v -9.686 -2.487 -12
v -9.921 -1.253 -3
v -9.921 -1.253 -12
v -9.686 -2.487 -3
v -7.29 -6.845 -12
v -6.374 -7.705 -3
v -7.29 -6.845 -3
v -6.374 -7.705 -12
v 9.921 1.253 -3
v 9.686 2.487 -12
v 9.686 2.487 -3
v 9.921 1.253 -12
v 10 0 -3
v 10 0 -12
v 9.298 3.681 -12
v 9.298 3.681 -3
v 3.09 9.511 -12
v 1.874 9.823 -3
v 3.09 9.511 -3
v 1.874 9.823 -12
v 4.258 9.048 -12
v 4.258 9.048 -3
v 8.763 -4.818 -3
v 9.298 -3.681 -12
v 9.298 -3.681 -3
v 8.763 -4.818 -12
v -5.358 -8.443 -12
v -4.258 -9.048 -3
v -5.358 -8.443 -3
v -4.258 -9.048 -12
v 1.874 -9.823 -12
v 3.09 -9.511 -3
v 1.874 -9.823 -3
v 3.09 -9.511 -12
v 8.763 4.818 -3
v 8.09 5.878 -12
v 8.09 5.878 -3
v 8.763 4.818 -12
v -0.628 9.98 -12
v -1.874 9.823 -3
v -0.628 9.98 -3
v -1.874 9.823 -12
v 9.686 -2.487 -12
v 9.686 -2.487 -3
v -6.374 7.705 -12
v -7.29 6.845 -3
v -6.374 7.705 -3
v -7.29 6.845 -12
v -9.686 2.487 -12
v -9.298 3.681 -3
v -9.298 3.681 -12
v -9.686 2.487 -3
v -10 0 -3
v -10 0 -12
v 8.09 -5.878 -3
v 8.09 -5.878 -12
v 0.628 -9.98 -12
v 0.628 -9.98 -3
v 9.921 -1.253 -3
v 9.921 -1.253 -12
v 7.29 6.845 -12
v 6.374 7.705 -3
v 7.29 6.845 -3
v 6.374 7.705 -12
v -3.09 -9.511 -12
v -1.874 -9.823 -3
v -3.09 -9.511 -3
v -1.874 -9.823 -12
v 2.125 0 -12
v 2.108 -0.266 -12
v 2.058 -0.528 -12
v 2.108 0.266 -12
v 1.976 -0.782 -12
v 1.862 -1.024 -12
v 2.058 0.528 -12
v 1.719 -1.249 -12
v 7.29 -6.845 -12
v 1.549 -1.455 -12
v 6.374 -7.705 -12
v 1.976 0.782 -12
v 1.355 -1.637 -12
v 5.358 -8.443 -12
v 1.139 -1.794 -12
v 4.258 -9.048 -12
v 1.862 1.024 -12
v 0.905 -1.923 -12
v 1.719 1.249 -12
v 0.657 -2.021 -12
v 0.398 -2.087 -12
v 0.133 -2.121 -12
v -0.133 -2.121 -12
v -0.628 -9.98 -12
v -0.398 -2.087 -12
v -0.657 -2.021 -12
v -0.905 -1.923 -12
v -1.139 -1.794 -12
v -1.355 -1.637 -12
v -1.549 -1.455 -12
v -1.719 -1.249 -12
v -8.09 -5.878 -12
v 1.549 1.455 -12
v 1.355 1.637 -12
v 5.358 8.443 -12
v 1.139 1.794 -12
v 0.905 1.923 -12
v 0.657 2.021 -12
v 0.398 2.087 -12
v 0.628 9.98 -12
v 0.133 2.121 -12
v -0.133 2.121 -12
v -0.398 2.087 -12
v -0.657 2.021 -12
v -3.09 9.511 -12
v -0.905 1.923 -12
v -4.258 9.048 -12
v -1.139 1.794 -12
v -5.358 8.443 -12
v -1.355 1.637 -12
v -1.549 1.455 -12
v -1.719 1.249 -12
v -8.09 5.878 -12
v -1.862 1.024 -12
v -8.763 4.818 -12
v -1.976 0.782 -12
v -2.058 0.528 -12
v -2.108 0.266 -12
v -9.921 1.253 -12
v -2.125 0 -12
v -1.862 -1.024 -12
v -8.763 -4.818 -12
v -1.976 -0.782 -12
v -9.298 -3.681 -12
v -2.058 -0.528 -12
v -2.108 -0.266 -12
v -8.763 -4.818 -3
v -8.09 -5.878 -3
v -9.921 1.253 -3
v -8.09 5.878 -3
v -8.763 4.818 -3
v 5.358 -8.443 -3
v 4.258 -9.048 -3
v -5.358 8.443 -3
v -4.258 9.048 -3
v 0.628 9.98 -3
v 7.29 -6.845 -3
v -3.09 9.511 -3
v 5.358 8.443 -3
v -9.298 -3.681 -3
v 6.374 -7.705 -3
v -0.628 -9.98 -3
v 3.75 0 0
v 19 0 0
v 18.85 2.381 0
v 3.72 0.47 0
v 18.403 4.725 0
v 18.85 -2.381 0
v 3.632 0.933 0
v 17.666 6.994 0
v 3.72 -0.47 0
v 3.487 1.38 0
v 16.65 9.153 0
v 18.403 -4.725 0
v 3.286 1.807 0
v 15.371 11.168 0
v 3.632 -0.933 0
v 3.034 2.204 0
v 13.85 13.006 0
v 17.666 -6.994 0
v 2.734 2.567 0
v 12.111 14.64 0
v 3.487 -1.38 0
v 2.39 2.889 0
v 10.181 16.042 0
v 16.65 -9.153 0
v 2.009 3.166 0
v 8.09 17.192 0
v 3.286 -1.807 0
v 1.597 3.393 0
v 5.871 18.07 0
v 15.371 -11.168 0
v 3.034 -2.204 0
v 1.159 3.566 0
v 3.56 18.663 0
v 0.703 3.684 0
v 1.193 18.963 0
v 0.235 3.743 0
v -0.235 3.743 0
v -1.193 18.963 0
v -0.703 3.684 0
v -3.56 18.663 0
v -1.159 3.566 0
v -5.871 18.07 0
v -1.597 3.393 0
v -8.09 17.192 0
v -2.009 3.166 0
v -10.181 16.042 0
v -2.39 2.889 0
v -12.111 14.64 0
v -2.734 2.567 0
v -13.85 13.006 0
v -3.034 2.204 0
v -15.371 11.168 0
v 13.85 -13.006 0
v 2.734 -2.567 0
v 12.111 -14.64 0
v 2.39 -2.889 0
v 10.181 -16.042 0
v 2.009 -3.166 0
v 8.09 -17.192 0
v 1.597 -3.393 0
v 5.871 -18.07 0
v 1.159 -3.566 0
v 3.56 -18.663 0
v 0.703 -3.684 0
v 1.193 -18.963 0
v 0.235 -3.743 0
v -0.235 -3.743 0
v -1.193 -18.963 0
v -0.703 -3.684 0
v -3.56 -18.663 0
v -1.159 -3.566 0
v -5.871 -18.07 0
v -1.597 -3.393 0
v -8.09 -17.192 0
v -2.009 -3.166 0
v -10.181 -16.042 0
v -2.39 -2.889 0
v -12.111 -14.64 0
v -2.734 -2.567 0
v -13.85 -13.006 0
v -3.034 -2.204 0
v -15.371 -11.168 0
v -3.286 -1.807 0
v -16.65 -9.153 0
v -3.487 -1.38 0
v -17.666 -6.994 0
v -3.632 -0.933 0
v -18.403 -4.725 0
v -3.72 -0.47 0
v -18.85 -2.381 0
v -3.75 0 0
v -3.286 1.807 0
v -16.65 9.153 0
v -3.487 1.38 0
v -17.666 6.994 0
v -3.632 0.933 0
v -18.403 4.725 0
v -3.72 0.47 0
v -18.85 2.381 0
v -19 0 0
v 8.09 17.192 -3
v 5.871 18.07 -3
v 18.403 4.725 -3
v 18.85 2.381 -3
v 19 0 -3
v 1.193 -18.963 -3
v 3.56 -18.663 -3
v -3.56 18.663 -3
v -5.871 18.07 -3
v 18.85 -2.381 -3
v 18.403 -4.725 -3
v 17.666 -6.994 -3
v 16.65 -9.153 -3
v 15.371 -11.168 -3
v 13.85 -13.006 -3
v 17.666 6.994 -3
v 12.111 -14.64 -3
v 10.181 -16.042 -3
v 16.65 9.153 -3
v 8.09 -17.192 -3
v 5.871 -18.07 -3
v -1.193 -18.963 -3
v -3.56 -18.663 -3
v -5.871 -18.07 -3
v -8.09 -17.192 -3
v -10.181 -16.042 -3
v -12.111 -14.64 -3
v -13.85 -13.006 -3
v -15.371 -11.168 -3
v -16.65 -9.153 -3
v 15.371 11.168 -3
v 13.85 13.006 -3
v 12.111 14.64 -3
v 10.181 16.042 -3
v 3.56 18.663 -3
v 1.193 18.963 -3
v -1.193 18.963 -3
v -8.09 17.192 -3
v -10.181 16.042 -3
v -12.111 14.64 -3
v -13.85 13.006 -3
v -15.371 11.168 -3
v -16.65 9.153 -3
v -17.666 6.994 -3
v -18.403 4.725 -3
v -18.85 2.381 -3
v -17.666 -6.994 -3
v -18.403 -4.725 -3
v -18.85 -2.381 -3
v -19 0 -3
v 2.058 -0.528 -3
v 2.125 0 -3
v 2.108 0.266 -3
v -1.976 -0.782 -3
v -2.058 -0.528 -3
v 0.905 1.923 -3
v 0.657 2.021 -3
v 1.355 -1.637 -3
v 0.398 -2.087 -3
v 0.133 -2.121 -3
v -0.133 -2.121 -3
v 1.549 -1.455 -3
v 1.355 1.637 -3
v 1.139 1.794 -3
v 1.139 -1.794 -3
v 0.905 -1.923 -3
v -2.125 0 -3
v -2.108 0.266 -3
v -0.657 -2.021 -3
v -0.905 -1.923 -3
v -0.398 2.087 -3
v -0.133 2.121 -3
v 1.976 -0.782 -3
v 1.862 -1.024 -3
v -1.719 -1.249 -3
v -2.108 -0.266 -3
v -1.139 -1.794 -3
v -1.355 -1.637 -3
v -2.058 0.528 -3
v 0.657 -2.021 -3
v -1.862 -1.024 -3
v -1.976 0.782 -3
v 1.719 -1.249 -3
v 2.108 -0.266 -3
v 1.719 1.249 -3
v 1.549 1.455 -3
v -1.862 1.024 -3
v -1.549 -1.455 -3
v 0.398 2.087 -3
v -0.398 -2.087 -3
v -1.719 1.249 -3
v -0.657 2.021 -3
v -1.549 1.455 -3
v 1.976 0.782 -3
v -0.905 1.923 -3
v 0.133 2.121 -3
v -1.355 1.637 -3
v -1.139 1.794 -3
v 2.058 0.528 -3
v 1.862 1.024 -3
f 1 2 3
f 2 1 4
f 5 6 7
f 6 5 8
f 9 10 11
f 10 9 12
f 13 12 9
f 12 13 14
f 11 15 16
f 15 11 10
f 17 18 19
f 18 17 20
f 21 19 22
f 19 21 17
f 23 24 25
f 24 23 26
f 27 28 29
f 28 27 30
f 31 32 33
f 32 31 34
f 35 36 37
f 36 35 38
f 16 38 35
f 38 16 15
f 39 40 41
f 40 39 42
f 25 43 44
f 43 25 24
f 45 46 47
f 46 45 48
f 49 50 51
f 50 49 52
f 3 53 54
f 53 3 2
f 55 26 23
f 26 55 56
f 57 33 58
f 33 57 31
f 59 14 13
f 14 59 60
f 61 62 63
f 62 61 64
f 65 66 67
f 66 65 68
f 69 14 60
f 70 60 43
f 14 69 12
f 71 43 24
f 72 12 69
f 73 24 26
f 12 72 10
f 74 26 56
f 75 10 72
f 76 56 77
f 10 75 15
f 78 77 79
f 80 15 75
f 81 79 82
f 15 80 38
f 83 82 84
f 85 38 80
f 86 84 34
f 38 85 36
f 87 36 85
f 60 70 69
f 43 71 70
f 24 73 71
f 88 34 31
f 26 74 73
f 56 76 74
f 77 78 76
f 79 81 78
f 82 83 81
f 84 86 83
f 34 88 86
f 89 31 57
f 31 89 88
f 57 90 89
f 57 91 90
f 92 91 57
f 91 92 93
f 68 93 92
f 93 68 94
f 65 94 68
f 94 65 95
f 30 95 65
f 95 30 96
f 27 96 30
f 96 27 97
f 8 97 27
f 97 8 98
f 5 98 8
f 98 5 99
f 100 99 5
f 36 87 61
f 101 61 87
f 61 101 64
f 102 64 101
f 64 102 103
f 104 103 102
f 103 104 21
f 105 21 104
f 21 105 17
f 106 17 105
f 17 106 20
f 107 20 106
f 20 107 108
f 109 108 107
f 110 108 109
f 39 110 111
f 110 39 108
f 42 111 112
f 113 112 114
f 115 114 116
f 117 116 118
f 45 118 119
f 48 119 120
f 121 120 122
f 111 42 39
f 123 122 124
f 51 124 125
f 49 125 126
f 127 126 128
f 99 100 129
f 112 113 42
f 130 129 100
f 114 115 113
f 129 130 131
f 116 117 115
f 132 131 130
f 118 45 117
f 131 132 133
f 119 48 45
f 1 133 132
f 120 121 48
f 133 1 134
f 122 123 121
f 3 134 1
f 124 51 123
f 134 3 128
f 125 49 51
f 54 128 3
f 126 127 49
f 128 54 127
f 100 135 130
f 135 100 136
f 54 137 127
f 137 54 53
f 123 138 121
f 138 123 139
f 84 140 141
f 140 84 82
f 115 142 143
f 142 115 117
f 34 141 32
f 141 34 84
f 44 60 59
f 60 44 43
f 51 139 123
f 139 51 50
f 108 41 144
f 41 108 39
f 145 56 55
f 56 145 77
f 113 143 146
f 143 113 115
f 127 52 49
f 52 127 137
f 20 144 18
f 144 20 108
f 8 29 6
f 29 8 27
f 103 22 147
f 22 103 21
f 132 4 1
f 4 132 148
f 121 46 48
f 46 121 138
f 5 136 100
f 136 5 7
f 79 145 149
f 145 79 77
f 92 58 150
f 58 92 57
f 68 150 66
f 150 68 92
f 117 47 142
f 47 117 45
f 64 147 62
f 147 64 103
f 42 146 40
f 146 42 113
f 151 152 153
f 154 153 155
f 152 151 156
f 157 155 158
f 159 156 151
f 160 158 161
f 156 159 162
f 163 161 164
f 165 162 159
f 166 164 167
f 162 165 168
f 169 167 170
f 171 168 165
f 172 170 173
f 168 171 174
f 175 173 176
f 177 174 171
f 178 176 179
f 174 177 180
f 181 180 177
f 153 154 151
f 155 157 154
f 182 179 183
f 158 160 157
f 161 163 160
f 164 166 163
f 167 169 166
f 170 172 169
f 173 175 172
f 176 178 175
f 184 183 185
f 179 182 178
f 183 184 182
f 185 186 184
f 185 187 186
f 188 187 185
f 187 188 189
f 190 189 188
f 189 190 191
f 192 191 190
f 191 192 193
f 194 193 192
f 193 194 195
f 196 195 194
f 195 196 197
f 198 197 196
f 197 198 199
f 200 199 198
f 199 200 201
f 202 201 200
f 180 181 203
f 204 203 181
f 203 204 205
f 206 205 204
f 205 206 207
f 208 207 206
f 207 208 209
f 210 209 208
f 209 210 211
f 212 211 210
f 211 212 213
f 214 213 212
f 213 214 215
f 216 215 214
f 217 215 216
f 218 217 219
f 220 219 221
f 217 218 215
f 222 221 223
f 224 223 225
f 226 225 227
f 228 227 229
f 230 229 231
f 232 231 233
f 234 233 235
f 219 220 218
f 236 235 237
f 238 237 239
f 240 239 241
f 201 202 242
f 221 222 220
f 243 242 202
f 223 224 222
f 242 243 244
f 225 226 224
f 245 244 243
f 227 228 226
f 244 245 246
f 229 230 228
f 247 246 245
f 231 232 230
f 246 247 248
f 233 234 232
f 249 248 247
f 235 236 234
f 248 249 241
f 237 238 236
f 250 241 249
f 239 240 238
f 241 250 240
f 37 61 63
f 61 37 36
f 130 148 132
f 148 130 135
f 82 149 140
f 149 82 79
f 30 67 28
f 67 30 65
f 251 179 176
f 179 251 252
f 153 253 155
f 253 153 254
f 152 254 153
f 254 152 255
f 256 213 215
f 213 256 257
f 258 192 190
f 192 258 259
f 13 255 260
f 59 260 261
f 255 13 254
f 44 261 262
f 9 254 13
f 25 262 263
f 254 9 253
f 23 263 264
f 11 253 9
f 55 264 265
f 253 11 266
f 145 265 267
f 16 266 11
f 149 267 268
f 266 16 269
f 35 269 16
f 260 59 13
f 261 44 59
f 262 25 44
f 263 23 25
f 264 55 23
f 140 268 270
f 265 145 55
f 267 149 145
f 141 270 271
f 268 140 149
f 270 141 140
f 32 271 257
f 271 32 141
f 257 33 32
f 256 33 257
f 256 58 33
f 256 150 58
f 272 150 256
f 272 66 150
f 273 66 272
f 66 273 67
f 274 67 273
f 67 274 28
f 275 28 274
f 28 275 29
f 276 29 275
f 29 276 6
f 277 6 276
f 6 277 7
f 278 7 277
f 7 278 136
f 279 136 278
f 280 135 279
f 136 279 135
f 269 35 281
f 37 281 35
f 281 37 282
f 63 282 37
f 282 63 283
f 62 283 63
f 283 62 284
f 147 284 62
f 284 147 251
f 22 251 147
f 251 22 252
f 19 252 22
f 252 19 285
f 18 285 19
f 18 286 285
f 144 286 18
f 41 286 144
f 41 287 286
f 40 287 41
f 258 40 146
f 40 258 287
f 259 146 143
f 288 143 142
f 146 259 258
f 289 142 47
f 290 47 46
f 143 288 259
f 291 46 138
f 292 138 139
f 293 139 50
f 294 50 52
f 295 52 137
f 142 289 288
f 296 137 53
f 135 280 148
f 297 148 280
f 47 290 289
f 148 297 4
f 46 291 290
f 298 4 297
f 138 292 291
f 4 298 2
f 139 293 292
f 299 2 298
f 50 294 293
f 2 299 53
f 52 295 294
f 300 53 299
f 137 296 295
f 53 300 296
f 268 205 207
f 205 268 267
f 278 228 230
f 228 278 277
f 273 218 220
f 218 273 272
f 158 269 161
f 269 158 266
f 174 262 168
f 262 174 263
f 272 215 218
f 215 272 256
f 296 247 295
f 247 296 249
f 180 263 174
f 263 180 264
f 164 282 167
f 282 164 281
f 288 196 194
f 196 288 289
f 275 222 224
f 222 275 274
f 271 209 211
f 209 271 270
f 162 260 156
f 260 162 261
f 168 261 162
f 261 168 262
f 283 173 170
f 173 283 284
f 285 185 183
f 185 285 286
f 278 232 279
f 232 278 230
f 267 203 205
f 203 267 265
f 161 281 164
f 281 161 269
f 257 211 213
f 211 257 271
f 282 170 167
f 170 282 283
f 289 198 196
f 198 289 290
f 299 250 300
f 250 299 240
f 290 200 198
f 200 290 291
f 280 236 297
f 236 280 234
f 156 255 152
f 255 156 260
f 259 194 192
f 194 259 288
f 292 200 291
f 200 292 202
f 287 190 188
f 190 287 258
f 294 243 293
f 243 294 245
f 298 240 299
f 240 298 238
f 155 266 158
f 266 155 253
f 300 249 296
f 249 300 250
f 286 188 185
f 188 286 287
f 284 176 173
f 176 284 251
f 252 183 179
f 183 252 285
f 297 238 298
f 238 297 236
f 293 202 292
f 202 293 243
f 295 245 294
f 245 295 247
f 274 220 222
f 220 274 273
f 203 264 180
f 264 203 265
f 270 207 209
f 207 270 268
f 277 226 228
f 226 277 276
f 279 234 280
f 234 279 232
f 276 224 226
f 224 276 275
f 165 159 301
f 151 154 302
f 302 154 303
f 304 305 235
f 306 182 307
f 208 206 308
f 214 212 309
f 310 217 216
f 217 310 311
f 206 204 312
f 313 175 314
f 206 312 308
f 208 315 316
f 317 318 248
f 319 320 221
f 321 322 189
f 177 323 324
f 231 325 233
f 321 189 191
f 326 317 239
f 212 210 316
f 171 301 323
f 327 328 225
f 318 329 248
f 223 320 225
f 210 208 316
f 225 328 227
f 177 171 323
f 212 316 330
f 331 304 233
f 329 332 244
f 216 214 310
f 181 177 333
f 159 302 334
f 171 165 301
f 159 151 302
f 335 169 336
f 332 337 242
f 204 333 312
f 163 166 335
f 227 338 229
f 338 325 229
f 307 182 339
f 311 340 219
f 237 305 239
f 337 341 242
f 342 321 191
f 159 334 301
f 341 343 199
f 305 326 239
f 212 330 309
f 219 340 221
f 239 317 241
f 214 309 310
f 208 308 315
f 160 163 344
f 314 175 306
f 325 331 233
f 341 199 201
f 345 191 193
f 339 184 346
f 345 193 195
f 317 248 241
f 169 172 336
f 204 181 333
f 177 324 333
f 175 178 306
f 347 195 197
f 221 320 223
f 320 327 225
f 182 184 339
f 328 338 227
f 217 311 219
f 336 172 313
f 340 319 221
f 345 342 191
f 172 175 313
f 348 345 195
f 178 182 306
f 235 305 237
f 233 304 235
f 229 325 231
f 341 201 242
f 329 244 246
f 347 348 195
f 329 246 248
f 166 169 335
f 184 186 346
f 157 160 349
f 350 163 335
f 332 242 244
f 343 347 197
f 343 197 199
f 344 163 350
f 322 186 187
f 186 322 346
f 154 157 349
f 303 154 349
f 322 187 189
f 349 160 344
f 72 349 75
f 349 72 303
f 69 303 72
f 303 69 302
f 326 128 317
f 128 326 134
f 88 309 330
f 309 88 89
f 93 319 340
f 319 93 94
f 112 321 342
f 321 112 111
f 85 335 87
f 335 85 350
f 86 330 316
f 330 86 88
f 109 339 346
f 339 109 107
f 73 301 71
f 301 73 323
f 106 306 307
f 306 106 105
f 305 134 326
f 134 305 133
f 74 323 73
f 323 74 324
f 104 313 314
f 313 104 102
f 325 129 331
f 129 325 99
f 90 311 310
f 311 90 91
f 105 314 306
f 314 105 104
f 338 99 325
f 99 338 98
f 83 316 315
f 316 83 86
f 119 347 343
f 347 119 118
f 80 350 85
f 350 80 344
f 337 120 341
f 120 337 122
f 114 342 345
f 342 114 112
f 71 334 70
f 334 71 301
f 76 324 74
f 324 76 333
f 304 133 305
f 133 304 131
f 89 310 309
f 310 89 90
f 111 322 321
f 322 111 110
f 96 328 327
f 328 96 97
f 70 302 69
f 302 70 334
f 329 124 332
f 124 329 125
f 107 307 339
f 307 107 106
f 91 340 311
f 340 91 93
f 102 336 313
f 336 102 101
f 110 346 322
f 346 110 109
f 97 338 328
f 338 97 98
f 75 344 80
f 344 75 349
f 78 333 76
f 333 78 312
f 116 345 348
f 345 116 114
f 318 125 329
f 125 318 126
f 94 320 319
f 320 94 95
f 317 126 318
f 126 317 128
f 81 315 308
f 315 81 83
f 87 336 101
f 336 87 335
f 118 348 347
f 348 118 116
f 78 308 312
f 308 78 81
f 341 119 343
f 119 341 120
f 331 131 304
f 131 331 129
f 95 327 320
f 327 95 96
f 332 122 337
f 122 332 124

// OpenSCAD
$fn = 50;


difference() {
	union() {
		translate(v = [0, 0, -12.0000000000]) {
			cylinder(h = 12, r = 10.0000000000);
		}
		translate(v = [0, 0, -3.0000000000]) {
			cylinder(h = 3, r = 19.0000000000);
		}
	}
	union() {
		translate(v = [0, 0, 0]) {
			rotate(a = [0, 0, 0]) {
				difference() {
					union() {
						#translate(v = [0, 0, -12.0000000000]) {
							cylinder(h = 12, r = 2.0000000000);
						}
						#translate(v = [0, 0, -3]) {
							cylinder(h = 3, r = 10.0000000000, r1 = 2.1250000000, r2 = 3.7500000000);
						}
						#translate(v = [0, 0, -12.0000000000]) {
							cylinder(h = 12, r = 2.1250000000);
						}
						#translate(v = [0, 0, -12.0000000000]) {
							cylinder(h = 12, r = 2.0000000000);
						}
					}
					union();
				}
			}
		}
	}
}
